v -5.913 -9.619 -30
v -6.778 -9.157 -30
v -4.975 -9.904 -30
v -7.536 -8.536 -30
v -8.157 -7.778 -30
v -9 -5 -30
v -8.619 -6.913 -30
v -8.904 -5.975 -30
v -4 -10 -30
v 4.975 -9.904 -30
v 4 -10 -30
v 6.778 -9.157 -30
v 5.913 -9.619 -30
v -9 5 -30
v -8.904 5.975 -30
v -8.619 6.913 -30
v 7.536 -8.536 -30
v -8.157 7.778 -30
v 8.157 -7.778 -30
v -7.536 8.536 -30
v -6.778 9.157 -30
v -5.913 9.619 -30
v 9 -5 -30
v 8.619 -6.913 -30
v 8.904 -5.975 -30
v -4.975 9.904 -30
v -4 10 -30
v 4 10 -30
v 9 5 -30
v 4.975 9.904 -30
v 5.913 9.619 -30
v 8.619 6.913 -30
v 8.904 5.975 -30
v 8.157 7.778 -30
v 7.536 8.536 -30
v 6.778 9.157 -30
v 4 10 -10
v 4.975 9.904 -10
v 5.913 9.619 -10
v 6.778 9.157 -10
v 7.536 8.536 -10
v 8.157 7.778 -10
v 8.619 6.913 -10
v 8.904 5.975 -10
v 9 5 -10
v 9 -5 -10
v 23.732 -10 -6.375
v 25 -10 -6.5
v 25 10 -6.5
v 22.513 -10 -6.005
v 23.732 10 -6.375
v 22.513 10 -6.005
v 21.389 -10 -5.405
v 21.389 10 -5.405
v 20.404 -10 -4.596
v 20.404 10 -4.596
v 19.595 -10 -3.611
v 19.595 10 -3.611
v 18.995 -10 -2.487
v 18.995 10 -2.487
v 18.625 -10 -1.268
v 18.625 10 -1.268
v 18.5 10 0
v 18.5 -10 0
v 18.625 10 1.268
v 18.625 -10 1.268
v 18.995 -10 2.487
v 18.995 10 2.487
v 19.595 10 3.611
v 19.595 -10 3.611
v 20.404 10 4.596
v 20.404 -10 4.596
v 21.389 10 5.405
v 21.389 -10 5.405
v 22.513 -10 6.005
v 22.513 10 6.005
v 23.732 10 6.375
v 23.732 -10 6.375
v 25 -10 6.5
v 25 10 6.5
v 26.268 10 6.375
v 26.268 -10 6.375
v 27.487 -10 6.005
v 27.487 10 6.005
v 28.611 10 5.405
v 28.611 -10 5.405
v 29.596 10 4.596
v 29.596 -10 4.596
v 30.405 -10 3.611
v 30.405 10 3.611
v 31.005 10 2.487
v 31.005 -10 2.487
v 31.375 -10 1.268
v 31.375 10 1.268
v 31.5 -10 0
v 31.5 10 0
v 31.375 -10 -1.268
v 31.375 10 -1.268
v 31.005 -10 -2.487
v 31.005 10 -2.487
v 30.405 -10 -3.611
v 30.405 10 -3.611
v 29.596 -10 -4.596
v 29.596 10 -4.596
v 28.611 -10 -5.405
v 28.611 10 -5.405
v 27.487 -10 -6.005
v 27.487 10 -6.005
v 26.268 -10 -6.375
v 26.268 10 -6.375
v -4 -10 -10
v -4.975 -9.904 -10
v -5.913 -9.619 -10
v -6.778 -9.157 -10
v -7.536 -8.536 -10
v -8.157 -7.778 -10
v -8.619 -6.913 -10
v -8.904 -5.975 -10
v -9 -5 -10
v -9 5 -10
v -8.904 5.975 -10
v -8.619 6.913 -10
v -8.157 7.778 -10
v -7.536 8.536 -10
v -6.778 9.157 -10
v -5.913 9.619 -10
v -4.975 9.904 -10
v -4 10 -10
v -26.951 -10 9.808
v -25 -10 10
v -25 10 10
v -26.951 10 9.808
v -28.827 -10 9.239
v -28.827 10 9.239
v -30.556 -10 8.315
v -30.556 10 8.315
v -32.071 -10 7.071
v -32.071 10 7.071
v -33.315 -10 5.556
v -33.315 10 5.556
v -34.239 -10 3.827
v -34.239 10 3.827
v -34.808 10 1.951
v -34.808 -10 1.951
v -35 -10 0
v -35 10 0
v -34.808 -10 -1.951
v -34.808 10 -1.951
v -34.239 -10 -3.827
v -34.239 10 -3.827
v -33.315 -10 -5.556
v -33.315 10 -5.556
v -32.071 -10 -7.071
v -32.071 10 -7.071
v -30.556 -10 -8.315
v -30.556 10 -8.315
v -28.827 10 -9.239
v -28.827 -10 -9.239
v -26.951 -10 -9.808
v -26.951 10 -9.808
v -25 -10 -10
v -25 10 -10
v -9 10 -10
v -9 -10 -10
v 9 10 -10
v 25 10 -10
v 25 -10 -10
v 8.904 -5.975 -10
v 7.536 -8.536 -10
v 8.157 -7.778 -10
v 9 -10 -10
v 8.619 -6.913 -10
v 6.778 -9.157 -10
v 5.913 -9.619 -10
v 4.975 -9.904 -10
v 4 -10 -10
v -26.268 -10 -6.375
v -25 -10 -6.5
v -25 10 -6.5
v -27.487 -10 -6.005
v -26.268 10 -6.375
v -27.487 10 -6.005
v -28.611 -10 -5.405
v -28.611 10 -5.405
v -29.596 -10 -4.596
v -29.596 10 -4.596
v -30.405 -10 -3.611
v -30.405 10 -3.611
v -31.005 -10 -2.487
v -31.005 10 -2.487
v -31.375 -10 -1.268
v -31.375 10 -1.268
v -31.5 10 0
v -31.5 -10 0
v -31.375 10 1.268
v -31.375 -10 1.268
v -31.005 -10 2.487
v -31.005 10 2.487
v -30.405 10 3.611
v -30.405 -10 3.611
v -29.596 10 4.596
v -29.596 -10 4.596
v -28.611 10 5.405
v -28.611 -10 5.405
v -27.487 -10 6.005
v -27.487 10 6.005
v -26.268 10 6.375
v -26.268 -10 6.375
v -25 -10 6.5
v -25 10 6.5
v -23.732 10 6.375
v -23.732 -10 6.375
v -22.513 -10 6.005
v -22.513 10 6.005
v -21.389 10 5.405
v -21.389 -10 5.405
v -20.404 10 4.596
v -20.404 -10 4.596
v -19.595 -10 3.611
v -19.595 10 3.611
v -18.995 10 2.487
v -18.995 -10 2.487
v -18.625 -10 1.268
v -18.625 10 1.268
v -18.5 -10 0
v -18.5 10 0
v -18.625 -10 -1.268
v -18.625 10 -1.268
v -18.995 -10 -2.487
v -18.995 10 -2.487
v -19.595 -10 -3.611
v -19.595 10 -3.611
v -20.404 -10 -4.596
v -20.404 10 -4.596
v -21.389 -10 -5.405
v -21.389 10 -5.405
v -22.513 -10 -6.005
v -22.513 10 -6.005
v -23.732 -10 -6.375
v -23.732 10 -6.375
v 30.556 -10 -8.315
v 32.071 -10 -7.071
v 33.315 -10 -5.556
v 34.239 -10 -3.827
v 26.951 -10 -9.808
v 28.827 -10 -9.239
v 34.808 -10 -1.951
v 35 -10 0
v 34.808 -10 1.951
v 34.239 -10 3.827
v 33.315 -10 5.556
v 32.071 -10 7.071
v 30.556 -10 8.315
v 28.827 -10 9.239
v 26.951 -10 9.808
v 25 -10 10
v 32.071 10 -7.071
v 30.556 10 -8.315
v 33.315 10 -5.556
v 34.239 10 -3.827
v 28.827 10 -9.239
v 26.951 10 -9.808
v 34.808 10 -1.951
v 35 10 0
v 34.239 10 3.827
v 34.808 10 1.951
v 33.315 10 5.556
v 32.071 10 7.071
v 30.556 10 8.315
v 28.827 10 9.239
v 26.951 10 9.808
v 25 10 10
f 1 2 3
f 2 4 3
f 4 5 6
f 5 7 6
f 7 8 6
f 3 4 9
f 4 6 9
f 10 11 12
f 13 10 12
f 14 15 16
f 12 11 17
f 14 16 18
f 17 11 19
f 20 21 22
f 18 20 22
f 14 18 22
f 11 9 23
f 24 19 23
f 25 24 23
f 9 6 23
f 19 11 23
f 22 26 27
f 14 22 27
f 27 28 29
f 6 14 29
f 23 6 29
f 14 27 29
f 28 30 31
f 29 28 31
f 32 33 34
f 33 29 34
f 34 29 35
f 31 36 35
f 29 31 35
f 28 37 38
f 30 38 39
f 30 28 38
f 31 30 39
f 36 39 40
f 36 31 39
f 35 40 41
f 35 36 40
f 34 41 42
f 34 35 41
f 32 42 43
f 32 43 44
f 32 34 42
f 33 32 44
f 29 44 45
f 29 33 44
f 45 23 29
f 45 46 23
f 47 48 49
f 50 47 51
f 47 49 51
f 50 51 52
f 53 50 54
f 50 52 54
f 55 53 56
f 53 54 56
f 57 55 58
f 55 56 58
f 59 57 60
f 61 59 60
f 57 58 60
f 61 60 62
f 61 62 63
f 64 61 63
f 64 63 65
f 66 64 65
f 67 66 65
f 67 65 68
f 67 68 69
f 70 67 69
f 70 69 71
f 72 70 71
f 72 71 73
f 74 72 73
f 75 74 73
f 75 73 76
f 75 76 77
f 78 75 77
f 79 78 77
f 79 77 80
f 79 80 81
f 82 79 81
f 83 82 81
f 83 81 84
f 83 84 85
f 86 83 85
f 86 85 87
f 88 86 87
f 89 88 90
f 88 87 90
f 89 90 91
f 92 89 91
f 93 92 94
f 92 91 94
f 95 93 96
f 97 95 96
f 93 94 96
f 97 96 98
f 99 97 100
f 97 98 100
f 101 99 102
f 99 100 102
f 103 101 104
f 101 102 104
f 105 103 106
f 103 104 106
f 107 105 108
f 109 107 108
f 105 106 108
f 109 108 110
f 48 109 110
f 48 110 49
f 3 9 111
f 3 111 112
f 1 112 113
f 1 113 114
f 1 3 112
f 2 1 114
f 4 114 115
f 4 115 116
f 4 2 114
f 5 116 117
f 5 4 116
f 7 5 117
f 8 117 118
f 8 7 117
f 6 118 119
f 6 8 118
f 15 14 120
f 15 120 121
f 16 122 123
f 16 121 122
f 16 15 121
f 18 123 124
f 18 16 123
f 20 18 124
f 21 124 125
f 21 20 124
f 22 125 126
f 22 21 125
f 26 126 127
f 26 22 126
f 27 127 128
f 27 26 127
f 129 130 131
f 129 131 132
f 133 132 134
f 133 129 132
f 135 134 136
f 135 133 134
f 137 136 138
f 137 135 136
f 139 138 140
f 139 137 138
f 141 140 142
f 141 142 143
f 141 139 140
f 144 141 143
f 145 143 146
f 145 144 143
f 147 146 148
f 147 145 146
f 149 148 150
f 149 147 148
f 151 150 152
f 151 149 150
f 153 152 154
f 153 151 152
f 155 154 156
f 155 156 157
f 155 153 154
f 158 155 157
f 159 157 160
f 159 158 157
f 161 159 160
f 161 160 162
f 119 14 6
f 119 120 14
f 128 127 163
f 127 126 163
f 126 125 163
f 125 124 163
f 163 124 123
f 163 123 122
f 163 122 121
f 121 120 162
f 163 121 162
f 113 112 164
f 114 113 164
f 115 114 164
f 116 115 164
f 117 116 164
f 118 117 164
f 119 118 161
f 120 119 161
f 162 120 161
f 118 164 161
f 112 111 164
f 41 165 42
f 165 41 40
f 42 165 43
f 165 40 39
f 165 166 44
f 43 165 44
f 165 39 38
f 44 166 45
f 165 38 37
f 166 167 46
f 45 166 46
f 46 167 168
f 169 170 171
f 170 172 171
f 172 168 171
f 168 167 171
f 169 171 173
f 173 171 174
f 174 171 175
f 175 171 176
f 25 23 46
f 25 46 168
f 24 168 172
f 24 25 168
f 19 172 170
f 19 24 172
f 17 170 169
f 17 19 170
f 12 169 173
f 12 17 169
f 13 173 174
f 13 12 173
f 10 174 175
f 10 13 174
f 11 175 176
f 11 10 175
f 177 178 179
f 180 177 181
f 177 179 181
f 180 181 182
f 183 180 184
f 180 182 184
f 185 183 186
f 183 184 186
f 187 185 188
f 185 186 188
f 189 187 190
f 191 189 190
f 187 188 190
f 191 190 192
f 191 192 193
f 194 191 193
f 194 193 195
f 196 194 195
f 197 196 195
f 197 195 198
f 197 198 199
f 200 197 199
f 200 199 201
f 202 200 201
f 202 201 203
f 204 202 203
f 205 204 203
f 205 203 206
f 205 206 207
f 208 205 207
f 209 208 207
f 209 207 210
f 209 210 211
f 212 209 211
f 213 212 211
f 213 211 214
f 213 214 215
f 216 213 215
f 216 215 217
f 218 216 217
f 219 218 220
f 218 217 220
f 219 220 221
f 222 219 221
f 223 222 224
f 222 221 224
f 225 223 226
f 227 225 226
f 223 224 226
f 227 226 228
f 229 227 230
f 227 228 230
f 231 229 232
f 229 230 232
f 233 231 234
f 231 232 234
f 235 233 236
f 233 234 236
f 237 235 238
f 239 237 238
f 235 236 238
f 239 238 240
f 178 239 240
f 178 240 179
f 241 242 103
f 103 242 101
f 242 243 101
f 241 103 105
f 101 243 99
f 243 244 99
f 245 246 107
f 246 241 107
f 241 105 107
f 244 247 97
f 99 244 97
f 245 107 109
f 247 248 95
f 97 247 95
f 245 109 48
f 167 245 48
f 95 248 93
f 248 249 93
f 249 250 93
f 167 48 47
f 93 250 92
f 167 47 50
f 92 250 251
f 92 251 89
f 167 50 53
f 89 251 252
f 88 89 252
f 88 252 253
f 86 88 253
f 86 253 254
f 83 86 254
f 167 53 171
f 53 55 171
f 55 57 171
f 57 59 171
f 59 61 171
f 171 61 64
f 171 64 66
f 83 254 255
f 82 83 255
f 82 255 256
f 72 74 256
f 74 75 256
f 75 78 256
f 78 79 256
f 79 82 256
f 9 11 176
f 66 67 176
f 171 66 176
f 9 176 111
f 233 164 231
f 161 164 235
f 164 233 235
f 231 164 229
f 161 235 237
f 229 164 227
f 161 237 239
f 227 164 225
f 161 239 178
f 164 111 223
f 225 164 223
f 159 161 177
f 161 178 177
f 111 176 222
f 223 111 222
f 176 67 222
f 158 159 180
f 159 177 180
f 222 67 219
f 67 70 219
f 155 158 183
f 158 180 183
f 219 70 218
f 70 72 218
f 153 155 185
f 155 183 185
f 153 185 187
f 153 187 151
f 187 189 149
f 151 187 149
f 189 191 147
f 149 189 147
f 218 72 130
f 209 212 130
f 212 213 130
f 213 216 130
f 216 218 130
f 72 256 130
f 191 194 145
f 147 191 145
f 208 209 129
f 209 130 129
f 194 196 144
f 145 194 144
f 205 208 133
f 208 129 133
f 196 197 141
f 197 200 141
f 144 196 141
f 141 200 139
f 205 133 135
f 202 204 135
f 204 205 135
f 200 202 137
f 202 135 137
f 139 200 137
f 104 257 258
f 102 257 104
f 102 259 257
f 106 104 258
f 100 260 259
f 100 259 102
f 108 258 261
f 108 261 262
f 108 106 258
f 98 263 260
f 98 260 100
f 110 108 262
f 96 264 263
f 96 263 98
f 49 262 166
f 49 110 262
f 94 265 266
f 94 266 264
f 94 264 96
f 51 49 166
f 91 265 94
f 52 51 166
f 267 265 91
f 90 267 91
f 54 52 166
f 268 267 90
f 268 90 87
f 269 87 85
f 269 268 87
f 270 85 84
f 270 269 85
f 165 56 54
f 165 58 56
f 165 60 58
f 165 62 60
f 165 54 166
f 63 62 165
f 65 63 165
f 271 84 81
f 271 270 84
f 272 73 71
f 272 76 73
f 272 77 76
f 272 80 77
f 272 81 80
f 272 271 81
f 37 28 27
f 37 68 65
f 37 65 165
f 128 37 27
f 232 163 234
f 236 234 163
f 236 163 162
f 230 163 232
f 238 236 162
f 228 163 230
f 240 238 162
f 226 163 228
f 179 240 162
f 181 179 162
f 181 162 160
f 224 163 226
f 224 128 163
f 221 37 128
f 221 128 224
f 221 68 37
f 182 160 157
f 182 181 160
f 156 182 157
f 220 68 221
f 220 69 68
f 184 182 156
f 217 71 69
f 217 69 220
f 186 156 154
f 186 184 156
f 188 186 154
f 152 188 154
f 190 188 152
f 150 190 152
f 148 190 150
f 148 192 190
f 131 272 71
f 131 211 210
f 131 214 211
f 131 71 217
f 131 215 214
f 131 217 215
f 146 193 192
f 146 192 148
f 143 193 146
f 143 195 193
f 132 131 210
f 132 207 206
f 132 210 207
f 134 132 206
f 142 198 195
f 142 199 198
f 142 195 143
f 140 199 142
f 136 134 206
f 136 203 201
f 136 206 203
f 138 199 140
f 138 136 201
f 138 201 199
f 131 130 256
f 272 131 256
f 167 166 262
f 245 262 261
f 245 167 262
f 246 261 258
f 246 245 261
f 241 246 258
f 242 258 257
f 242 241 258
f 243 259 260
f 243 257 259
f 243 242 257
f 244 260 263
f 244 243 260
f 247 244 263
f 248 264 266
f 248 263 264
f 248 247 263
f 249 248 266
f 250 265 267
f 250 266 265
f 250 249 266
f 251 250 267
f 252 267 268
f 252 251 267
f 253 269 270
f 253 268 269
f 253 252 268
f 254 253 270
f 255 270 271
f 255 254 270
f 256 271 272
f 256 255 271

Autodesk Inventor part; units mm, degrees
sketch "Skizze1" plane through (0, 0, 0) normal (0, 1, 0) x (-1, 0, 0)
  line L0 (25, 10) -> (-25, 10)
  line L1 (-35, 0) -> (-35, 0)
  line L2 (-25, -10) -> (25, -10)
  line L3 (35, 0) -> (35, 0)
  line L4 (51.8995, 0) -> (-51.8995, 0) projected
  line L5 (0, -16.8995) -> (0, 16.8995) projected
  arc A0 (35, 8) -> (33, 10) centre (33, 8) ccw
  arc A1 (33, -10) -> (35, -8) centre (33, -8) ccw
  arc A2 (-33, 10) -> (-35, 8) centre (-33, 8) ccw
  arc A3 (-35, -8) -> (-33, -10) centre (-33, -8) ccw
  arc A4 (35, 0) -> (25, 10) centre (25, 0) ccw
  arc A5 (25, -10) -> (35, 0) centre (25, 0) ccw
  arc A6 (-25, 10) -> (-35, 0) centre (-25, 0) ccw
  arc A7 (-35, 0) -> (-25, -10) centre (-25, 0) ccw
  point P0 (0, 0)
  point P1 (-35, -10)
  point P2 (-35, 10)
  point P3 (35, -10)
  point P4 (-35, 0)
  dimension "d0" = 70
  dimension "d1" = 20
  dimension "d2" = 2
  dimension "d3" = 10
extrude "Extrusion1" add sketch "Skizze1" along normal mid plane 20
ref_plane "Arbeitsebene1" through (0, -10, 0) normal (0, 1, 0) x (-1, 0, 0)
sketch "Skizze3" plane through (0, -10, 0) normal (0, -1, 0) x (1, 0, 0)
  arc A0 (-25, 10) -> (-25, -10) centre (-25, 0) ccw projected
  arc A1 (25, -10) -> (25, 10) centre (25, 0) ccw projected
  point P0 (0, 0)
hole "Bohrung1" at (-25, -10, 0) at (25, -10, 0) direction (0, 1, 0) diameter 6.756 end through all counterbore diameter 13 counterbore depth 20
ref_plane "Arbeitsebene2" through (0, 0, -10) normal (0, 0, 1) x (1, 0, 0)
sketch "Skizze4" plane through (0, 0, -10) normal (0, 0, 1) x (1, 0, 0)
  line L0 (9, 10) -> (-9, 10)
  line L1 (-9, 10) -> (-9, -10)
  line L2 (-9, -10) -> (9, -10)
  line L3 (9, -10) -> (9, 10)
  line L4 (0, -26) -> (0, 16) projected
  line L5 (-49, 0) -> (49, 0) projected
  dimension "d15" = 18
  dimension "d16" = 20
extrude "Extrusion2" add sketch "Skizze4" against normal blind 20
fillet "Rundung1" radius 5 4 edges at (-9, -10, -20) (9, -10, -20) (9, 10, -20) (-9, 10, -20)
properties part number "Schlitten1"
